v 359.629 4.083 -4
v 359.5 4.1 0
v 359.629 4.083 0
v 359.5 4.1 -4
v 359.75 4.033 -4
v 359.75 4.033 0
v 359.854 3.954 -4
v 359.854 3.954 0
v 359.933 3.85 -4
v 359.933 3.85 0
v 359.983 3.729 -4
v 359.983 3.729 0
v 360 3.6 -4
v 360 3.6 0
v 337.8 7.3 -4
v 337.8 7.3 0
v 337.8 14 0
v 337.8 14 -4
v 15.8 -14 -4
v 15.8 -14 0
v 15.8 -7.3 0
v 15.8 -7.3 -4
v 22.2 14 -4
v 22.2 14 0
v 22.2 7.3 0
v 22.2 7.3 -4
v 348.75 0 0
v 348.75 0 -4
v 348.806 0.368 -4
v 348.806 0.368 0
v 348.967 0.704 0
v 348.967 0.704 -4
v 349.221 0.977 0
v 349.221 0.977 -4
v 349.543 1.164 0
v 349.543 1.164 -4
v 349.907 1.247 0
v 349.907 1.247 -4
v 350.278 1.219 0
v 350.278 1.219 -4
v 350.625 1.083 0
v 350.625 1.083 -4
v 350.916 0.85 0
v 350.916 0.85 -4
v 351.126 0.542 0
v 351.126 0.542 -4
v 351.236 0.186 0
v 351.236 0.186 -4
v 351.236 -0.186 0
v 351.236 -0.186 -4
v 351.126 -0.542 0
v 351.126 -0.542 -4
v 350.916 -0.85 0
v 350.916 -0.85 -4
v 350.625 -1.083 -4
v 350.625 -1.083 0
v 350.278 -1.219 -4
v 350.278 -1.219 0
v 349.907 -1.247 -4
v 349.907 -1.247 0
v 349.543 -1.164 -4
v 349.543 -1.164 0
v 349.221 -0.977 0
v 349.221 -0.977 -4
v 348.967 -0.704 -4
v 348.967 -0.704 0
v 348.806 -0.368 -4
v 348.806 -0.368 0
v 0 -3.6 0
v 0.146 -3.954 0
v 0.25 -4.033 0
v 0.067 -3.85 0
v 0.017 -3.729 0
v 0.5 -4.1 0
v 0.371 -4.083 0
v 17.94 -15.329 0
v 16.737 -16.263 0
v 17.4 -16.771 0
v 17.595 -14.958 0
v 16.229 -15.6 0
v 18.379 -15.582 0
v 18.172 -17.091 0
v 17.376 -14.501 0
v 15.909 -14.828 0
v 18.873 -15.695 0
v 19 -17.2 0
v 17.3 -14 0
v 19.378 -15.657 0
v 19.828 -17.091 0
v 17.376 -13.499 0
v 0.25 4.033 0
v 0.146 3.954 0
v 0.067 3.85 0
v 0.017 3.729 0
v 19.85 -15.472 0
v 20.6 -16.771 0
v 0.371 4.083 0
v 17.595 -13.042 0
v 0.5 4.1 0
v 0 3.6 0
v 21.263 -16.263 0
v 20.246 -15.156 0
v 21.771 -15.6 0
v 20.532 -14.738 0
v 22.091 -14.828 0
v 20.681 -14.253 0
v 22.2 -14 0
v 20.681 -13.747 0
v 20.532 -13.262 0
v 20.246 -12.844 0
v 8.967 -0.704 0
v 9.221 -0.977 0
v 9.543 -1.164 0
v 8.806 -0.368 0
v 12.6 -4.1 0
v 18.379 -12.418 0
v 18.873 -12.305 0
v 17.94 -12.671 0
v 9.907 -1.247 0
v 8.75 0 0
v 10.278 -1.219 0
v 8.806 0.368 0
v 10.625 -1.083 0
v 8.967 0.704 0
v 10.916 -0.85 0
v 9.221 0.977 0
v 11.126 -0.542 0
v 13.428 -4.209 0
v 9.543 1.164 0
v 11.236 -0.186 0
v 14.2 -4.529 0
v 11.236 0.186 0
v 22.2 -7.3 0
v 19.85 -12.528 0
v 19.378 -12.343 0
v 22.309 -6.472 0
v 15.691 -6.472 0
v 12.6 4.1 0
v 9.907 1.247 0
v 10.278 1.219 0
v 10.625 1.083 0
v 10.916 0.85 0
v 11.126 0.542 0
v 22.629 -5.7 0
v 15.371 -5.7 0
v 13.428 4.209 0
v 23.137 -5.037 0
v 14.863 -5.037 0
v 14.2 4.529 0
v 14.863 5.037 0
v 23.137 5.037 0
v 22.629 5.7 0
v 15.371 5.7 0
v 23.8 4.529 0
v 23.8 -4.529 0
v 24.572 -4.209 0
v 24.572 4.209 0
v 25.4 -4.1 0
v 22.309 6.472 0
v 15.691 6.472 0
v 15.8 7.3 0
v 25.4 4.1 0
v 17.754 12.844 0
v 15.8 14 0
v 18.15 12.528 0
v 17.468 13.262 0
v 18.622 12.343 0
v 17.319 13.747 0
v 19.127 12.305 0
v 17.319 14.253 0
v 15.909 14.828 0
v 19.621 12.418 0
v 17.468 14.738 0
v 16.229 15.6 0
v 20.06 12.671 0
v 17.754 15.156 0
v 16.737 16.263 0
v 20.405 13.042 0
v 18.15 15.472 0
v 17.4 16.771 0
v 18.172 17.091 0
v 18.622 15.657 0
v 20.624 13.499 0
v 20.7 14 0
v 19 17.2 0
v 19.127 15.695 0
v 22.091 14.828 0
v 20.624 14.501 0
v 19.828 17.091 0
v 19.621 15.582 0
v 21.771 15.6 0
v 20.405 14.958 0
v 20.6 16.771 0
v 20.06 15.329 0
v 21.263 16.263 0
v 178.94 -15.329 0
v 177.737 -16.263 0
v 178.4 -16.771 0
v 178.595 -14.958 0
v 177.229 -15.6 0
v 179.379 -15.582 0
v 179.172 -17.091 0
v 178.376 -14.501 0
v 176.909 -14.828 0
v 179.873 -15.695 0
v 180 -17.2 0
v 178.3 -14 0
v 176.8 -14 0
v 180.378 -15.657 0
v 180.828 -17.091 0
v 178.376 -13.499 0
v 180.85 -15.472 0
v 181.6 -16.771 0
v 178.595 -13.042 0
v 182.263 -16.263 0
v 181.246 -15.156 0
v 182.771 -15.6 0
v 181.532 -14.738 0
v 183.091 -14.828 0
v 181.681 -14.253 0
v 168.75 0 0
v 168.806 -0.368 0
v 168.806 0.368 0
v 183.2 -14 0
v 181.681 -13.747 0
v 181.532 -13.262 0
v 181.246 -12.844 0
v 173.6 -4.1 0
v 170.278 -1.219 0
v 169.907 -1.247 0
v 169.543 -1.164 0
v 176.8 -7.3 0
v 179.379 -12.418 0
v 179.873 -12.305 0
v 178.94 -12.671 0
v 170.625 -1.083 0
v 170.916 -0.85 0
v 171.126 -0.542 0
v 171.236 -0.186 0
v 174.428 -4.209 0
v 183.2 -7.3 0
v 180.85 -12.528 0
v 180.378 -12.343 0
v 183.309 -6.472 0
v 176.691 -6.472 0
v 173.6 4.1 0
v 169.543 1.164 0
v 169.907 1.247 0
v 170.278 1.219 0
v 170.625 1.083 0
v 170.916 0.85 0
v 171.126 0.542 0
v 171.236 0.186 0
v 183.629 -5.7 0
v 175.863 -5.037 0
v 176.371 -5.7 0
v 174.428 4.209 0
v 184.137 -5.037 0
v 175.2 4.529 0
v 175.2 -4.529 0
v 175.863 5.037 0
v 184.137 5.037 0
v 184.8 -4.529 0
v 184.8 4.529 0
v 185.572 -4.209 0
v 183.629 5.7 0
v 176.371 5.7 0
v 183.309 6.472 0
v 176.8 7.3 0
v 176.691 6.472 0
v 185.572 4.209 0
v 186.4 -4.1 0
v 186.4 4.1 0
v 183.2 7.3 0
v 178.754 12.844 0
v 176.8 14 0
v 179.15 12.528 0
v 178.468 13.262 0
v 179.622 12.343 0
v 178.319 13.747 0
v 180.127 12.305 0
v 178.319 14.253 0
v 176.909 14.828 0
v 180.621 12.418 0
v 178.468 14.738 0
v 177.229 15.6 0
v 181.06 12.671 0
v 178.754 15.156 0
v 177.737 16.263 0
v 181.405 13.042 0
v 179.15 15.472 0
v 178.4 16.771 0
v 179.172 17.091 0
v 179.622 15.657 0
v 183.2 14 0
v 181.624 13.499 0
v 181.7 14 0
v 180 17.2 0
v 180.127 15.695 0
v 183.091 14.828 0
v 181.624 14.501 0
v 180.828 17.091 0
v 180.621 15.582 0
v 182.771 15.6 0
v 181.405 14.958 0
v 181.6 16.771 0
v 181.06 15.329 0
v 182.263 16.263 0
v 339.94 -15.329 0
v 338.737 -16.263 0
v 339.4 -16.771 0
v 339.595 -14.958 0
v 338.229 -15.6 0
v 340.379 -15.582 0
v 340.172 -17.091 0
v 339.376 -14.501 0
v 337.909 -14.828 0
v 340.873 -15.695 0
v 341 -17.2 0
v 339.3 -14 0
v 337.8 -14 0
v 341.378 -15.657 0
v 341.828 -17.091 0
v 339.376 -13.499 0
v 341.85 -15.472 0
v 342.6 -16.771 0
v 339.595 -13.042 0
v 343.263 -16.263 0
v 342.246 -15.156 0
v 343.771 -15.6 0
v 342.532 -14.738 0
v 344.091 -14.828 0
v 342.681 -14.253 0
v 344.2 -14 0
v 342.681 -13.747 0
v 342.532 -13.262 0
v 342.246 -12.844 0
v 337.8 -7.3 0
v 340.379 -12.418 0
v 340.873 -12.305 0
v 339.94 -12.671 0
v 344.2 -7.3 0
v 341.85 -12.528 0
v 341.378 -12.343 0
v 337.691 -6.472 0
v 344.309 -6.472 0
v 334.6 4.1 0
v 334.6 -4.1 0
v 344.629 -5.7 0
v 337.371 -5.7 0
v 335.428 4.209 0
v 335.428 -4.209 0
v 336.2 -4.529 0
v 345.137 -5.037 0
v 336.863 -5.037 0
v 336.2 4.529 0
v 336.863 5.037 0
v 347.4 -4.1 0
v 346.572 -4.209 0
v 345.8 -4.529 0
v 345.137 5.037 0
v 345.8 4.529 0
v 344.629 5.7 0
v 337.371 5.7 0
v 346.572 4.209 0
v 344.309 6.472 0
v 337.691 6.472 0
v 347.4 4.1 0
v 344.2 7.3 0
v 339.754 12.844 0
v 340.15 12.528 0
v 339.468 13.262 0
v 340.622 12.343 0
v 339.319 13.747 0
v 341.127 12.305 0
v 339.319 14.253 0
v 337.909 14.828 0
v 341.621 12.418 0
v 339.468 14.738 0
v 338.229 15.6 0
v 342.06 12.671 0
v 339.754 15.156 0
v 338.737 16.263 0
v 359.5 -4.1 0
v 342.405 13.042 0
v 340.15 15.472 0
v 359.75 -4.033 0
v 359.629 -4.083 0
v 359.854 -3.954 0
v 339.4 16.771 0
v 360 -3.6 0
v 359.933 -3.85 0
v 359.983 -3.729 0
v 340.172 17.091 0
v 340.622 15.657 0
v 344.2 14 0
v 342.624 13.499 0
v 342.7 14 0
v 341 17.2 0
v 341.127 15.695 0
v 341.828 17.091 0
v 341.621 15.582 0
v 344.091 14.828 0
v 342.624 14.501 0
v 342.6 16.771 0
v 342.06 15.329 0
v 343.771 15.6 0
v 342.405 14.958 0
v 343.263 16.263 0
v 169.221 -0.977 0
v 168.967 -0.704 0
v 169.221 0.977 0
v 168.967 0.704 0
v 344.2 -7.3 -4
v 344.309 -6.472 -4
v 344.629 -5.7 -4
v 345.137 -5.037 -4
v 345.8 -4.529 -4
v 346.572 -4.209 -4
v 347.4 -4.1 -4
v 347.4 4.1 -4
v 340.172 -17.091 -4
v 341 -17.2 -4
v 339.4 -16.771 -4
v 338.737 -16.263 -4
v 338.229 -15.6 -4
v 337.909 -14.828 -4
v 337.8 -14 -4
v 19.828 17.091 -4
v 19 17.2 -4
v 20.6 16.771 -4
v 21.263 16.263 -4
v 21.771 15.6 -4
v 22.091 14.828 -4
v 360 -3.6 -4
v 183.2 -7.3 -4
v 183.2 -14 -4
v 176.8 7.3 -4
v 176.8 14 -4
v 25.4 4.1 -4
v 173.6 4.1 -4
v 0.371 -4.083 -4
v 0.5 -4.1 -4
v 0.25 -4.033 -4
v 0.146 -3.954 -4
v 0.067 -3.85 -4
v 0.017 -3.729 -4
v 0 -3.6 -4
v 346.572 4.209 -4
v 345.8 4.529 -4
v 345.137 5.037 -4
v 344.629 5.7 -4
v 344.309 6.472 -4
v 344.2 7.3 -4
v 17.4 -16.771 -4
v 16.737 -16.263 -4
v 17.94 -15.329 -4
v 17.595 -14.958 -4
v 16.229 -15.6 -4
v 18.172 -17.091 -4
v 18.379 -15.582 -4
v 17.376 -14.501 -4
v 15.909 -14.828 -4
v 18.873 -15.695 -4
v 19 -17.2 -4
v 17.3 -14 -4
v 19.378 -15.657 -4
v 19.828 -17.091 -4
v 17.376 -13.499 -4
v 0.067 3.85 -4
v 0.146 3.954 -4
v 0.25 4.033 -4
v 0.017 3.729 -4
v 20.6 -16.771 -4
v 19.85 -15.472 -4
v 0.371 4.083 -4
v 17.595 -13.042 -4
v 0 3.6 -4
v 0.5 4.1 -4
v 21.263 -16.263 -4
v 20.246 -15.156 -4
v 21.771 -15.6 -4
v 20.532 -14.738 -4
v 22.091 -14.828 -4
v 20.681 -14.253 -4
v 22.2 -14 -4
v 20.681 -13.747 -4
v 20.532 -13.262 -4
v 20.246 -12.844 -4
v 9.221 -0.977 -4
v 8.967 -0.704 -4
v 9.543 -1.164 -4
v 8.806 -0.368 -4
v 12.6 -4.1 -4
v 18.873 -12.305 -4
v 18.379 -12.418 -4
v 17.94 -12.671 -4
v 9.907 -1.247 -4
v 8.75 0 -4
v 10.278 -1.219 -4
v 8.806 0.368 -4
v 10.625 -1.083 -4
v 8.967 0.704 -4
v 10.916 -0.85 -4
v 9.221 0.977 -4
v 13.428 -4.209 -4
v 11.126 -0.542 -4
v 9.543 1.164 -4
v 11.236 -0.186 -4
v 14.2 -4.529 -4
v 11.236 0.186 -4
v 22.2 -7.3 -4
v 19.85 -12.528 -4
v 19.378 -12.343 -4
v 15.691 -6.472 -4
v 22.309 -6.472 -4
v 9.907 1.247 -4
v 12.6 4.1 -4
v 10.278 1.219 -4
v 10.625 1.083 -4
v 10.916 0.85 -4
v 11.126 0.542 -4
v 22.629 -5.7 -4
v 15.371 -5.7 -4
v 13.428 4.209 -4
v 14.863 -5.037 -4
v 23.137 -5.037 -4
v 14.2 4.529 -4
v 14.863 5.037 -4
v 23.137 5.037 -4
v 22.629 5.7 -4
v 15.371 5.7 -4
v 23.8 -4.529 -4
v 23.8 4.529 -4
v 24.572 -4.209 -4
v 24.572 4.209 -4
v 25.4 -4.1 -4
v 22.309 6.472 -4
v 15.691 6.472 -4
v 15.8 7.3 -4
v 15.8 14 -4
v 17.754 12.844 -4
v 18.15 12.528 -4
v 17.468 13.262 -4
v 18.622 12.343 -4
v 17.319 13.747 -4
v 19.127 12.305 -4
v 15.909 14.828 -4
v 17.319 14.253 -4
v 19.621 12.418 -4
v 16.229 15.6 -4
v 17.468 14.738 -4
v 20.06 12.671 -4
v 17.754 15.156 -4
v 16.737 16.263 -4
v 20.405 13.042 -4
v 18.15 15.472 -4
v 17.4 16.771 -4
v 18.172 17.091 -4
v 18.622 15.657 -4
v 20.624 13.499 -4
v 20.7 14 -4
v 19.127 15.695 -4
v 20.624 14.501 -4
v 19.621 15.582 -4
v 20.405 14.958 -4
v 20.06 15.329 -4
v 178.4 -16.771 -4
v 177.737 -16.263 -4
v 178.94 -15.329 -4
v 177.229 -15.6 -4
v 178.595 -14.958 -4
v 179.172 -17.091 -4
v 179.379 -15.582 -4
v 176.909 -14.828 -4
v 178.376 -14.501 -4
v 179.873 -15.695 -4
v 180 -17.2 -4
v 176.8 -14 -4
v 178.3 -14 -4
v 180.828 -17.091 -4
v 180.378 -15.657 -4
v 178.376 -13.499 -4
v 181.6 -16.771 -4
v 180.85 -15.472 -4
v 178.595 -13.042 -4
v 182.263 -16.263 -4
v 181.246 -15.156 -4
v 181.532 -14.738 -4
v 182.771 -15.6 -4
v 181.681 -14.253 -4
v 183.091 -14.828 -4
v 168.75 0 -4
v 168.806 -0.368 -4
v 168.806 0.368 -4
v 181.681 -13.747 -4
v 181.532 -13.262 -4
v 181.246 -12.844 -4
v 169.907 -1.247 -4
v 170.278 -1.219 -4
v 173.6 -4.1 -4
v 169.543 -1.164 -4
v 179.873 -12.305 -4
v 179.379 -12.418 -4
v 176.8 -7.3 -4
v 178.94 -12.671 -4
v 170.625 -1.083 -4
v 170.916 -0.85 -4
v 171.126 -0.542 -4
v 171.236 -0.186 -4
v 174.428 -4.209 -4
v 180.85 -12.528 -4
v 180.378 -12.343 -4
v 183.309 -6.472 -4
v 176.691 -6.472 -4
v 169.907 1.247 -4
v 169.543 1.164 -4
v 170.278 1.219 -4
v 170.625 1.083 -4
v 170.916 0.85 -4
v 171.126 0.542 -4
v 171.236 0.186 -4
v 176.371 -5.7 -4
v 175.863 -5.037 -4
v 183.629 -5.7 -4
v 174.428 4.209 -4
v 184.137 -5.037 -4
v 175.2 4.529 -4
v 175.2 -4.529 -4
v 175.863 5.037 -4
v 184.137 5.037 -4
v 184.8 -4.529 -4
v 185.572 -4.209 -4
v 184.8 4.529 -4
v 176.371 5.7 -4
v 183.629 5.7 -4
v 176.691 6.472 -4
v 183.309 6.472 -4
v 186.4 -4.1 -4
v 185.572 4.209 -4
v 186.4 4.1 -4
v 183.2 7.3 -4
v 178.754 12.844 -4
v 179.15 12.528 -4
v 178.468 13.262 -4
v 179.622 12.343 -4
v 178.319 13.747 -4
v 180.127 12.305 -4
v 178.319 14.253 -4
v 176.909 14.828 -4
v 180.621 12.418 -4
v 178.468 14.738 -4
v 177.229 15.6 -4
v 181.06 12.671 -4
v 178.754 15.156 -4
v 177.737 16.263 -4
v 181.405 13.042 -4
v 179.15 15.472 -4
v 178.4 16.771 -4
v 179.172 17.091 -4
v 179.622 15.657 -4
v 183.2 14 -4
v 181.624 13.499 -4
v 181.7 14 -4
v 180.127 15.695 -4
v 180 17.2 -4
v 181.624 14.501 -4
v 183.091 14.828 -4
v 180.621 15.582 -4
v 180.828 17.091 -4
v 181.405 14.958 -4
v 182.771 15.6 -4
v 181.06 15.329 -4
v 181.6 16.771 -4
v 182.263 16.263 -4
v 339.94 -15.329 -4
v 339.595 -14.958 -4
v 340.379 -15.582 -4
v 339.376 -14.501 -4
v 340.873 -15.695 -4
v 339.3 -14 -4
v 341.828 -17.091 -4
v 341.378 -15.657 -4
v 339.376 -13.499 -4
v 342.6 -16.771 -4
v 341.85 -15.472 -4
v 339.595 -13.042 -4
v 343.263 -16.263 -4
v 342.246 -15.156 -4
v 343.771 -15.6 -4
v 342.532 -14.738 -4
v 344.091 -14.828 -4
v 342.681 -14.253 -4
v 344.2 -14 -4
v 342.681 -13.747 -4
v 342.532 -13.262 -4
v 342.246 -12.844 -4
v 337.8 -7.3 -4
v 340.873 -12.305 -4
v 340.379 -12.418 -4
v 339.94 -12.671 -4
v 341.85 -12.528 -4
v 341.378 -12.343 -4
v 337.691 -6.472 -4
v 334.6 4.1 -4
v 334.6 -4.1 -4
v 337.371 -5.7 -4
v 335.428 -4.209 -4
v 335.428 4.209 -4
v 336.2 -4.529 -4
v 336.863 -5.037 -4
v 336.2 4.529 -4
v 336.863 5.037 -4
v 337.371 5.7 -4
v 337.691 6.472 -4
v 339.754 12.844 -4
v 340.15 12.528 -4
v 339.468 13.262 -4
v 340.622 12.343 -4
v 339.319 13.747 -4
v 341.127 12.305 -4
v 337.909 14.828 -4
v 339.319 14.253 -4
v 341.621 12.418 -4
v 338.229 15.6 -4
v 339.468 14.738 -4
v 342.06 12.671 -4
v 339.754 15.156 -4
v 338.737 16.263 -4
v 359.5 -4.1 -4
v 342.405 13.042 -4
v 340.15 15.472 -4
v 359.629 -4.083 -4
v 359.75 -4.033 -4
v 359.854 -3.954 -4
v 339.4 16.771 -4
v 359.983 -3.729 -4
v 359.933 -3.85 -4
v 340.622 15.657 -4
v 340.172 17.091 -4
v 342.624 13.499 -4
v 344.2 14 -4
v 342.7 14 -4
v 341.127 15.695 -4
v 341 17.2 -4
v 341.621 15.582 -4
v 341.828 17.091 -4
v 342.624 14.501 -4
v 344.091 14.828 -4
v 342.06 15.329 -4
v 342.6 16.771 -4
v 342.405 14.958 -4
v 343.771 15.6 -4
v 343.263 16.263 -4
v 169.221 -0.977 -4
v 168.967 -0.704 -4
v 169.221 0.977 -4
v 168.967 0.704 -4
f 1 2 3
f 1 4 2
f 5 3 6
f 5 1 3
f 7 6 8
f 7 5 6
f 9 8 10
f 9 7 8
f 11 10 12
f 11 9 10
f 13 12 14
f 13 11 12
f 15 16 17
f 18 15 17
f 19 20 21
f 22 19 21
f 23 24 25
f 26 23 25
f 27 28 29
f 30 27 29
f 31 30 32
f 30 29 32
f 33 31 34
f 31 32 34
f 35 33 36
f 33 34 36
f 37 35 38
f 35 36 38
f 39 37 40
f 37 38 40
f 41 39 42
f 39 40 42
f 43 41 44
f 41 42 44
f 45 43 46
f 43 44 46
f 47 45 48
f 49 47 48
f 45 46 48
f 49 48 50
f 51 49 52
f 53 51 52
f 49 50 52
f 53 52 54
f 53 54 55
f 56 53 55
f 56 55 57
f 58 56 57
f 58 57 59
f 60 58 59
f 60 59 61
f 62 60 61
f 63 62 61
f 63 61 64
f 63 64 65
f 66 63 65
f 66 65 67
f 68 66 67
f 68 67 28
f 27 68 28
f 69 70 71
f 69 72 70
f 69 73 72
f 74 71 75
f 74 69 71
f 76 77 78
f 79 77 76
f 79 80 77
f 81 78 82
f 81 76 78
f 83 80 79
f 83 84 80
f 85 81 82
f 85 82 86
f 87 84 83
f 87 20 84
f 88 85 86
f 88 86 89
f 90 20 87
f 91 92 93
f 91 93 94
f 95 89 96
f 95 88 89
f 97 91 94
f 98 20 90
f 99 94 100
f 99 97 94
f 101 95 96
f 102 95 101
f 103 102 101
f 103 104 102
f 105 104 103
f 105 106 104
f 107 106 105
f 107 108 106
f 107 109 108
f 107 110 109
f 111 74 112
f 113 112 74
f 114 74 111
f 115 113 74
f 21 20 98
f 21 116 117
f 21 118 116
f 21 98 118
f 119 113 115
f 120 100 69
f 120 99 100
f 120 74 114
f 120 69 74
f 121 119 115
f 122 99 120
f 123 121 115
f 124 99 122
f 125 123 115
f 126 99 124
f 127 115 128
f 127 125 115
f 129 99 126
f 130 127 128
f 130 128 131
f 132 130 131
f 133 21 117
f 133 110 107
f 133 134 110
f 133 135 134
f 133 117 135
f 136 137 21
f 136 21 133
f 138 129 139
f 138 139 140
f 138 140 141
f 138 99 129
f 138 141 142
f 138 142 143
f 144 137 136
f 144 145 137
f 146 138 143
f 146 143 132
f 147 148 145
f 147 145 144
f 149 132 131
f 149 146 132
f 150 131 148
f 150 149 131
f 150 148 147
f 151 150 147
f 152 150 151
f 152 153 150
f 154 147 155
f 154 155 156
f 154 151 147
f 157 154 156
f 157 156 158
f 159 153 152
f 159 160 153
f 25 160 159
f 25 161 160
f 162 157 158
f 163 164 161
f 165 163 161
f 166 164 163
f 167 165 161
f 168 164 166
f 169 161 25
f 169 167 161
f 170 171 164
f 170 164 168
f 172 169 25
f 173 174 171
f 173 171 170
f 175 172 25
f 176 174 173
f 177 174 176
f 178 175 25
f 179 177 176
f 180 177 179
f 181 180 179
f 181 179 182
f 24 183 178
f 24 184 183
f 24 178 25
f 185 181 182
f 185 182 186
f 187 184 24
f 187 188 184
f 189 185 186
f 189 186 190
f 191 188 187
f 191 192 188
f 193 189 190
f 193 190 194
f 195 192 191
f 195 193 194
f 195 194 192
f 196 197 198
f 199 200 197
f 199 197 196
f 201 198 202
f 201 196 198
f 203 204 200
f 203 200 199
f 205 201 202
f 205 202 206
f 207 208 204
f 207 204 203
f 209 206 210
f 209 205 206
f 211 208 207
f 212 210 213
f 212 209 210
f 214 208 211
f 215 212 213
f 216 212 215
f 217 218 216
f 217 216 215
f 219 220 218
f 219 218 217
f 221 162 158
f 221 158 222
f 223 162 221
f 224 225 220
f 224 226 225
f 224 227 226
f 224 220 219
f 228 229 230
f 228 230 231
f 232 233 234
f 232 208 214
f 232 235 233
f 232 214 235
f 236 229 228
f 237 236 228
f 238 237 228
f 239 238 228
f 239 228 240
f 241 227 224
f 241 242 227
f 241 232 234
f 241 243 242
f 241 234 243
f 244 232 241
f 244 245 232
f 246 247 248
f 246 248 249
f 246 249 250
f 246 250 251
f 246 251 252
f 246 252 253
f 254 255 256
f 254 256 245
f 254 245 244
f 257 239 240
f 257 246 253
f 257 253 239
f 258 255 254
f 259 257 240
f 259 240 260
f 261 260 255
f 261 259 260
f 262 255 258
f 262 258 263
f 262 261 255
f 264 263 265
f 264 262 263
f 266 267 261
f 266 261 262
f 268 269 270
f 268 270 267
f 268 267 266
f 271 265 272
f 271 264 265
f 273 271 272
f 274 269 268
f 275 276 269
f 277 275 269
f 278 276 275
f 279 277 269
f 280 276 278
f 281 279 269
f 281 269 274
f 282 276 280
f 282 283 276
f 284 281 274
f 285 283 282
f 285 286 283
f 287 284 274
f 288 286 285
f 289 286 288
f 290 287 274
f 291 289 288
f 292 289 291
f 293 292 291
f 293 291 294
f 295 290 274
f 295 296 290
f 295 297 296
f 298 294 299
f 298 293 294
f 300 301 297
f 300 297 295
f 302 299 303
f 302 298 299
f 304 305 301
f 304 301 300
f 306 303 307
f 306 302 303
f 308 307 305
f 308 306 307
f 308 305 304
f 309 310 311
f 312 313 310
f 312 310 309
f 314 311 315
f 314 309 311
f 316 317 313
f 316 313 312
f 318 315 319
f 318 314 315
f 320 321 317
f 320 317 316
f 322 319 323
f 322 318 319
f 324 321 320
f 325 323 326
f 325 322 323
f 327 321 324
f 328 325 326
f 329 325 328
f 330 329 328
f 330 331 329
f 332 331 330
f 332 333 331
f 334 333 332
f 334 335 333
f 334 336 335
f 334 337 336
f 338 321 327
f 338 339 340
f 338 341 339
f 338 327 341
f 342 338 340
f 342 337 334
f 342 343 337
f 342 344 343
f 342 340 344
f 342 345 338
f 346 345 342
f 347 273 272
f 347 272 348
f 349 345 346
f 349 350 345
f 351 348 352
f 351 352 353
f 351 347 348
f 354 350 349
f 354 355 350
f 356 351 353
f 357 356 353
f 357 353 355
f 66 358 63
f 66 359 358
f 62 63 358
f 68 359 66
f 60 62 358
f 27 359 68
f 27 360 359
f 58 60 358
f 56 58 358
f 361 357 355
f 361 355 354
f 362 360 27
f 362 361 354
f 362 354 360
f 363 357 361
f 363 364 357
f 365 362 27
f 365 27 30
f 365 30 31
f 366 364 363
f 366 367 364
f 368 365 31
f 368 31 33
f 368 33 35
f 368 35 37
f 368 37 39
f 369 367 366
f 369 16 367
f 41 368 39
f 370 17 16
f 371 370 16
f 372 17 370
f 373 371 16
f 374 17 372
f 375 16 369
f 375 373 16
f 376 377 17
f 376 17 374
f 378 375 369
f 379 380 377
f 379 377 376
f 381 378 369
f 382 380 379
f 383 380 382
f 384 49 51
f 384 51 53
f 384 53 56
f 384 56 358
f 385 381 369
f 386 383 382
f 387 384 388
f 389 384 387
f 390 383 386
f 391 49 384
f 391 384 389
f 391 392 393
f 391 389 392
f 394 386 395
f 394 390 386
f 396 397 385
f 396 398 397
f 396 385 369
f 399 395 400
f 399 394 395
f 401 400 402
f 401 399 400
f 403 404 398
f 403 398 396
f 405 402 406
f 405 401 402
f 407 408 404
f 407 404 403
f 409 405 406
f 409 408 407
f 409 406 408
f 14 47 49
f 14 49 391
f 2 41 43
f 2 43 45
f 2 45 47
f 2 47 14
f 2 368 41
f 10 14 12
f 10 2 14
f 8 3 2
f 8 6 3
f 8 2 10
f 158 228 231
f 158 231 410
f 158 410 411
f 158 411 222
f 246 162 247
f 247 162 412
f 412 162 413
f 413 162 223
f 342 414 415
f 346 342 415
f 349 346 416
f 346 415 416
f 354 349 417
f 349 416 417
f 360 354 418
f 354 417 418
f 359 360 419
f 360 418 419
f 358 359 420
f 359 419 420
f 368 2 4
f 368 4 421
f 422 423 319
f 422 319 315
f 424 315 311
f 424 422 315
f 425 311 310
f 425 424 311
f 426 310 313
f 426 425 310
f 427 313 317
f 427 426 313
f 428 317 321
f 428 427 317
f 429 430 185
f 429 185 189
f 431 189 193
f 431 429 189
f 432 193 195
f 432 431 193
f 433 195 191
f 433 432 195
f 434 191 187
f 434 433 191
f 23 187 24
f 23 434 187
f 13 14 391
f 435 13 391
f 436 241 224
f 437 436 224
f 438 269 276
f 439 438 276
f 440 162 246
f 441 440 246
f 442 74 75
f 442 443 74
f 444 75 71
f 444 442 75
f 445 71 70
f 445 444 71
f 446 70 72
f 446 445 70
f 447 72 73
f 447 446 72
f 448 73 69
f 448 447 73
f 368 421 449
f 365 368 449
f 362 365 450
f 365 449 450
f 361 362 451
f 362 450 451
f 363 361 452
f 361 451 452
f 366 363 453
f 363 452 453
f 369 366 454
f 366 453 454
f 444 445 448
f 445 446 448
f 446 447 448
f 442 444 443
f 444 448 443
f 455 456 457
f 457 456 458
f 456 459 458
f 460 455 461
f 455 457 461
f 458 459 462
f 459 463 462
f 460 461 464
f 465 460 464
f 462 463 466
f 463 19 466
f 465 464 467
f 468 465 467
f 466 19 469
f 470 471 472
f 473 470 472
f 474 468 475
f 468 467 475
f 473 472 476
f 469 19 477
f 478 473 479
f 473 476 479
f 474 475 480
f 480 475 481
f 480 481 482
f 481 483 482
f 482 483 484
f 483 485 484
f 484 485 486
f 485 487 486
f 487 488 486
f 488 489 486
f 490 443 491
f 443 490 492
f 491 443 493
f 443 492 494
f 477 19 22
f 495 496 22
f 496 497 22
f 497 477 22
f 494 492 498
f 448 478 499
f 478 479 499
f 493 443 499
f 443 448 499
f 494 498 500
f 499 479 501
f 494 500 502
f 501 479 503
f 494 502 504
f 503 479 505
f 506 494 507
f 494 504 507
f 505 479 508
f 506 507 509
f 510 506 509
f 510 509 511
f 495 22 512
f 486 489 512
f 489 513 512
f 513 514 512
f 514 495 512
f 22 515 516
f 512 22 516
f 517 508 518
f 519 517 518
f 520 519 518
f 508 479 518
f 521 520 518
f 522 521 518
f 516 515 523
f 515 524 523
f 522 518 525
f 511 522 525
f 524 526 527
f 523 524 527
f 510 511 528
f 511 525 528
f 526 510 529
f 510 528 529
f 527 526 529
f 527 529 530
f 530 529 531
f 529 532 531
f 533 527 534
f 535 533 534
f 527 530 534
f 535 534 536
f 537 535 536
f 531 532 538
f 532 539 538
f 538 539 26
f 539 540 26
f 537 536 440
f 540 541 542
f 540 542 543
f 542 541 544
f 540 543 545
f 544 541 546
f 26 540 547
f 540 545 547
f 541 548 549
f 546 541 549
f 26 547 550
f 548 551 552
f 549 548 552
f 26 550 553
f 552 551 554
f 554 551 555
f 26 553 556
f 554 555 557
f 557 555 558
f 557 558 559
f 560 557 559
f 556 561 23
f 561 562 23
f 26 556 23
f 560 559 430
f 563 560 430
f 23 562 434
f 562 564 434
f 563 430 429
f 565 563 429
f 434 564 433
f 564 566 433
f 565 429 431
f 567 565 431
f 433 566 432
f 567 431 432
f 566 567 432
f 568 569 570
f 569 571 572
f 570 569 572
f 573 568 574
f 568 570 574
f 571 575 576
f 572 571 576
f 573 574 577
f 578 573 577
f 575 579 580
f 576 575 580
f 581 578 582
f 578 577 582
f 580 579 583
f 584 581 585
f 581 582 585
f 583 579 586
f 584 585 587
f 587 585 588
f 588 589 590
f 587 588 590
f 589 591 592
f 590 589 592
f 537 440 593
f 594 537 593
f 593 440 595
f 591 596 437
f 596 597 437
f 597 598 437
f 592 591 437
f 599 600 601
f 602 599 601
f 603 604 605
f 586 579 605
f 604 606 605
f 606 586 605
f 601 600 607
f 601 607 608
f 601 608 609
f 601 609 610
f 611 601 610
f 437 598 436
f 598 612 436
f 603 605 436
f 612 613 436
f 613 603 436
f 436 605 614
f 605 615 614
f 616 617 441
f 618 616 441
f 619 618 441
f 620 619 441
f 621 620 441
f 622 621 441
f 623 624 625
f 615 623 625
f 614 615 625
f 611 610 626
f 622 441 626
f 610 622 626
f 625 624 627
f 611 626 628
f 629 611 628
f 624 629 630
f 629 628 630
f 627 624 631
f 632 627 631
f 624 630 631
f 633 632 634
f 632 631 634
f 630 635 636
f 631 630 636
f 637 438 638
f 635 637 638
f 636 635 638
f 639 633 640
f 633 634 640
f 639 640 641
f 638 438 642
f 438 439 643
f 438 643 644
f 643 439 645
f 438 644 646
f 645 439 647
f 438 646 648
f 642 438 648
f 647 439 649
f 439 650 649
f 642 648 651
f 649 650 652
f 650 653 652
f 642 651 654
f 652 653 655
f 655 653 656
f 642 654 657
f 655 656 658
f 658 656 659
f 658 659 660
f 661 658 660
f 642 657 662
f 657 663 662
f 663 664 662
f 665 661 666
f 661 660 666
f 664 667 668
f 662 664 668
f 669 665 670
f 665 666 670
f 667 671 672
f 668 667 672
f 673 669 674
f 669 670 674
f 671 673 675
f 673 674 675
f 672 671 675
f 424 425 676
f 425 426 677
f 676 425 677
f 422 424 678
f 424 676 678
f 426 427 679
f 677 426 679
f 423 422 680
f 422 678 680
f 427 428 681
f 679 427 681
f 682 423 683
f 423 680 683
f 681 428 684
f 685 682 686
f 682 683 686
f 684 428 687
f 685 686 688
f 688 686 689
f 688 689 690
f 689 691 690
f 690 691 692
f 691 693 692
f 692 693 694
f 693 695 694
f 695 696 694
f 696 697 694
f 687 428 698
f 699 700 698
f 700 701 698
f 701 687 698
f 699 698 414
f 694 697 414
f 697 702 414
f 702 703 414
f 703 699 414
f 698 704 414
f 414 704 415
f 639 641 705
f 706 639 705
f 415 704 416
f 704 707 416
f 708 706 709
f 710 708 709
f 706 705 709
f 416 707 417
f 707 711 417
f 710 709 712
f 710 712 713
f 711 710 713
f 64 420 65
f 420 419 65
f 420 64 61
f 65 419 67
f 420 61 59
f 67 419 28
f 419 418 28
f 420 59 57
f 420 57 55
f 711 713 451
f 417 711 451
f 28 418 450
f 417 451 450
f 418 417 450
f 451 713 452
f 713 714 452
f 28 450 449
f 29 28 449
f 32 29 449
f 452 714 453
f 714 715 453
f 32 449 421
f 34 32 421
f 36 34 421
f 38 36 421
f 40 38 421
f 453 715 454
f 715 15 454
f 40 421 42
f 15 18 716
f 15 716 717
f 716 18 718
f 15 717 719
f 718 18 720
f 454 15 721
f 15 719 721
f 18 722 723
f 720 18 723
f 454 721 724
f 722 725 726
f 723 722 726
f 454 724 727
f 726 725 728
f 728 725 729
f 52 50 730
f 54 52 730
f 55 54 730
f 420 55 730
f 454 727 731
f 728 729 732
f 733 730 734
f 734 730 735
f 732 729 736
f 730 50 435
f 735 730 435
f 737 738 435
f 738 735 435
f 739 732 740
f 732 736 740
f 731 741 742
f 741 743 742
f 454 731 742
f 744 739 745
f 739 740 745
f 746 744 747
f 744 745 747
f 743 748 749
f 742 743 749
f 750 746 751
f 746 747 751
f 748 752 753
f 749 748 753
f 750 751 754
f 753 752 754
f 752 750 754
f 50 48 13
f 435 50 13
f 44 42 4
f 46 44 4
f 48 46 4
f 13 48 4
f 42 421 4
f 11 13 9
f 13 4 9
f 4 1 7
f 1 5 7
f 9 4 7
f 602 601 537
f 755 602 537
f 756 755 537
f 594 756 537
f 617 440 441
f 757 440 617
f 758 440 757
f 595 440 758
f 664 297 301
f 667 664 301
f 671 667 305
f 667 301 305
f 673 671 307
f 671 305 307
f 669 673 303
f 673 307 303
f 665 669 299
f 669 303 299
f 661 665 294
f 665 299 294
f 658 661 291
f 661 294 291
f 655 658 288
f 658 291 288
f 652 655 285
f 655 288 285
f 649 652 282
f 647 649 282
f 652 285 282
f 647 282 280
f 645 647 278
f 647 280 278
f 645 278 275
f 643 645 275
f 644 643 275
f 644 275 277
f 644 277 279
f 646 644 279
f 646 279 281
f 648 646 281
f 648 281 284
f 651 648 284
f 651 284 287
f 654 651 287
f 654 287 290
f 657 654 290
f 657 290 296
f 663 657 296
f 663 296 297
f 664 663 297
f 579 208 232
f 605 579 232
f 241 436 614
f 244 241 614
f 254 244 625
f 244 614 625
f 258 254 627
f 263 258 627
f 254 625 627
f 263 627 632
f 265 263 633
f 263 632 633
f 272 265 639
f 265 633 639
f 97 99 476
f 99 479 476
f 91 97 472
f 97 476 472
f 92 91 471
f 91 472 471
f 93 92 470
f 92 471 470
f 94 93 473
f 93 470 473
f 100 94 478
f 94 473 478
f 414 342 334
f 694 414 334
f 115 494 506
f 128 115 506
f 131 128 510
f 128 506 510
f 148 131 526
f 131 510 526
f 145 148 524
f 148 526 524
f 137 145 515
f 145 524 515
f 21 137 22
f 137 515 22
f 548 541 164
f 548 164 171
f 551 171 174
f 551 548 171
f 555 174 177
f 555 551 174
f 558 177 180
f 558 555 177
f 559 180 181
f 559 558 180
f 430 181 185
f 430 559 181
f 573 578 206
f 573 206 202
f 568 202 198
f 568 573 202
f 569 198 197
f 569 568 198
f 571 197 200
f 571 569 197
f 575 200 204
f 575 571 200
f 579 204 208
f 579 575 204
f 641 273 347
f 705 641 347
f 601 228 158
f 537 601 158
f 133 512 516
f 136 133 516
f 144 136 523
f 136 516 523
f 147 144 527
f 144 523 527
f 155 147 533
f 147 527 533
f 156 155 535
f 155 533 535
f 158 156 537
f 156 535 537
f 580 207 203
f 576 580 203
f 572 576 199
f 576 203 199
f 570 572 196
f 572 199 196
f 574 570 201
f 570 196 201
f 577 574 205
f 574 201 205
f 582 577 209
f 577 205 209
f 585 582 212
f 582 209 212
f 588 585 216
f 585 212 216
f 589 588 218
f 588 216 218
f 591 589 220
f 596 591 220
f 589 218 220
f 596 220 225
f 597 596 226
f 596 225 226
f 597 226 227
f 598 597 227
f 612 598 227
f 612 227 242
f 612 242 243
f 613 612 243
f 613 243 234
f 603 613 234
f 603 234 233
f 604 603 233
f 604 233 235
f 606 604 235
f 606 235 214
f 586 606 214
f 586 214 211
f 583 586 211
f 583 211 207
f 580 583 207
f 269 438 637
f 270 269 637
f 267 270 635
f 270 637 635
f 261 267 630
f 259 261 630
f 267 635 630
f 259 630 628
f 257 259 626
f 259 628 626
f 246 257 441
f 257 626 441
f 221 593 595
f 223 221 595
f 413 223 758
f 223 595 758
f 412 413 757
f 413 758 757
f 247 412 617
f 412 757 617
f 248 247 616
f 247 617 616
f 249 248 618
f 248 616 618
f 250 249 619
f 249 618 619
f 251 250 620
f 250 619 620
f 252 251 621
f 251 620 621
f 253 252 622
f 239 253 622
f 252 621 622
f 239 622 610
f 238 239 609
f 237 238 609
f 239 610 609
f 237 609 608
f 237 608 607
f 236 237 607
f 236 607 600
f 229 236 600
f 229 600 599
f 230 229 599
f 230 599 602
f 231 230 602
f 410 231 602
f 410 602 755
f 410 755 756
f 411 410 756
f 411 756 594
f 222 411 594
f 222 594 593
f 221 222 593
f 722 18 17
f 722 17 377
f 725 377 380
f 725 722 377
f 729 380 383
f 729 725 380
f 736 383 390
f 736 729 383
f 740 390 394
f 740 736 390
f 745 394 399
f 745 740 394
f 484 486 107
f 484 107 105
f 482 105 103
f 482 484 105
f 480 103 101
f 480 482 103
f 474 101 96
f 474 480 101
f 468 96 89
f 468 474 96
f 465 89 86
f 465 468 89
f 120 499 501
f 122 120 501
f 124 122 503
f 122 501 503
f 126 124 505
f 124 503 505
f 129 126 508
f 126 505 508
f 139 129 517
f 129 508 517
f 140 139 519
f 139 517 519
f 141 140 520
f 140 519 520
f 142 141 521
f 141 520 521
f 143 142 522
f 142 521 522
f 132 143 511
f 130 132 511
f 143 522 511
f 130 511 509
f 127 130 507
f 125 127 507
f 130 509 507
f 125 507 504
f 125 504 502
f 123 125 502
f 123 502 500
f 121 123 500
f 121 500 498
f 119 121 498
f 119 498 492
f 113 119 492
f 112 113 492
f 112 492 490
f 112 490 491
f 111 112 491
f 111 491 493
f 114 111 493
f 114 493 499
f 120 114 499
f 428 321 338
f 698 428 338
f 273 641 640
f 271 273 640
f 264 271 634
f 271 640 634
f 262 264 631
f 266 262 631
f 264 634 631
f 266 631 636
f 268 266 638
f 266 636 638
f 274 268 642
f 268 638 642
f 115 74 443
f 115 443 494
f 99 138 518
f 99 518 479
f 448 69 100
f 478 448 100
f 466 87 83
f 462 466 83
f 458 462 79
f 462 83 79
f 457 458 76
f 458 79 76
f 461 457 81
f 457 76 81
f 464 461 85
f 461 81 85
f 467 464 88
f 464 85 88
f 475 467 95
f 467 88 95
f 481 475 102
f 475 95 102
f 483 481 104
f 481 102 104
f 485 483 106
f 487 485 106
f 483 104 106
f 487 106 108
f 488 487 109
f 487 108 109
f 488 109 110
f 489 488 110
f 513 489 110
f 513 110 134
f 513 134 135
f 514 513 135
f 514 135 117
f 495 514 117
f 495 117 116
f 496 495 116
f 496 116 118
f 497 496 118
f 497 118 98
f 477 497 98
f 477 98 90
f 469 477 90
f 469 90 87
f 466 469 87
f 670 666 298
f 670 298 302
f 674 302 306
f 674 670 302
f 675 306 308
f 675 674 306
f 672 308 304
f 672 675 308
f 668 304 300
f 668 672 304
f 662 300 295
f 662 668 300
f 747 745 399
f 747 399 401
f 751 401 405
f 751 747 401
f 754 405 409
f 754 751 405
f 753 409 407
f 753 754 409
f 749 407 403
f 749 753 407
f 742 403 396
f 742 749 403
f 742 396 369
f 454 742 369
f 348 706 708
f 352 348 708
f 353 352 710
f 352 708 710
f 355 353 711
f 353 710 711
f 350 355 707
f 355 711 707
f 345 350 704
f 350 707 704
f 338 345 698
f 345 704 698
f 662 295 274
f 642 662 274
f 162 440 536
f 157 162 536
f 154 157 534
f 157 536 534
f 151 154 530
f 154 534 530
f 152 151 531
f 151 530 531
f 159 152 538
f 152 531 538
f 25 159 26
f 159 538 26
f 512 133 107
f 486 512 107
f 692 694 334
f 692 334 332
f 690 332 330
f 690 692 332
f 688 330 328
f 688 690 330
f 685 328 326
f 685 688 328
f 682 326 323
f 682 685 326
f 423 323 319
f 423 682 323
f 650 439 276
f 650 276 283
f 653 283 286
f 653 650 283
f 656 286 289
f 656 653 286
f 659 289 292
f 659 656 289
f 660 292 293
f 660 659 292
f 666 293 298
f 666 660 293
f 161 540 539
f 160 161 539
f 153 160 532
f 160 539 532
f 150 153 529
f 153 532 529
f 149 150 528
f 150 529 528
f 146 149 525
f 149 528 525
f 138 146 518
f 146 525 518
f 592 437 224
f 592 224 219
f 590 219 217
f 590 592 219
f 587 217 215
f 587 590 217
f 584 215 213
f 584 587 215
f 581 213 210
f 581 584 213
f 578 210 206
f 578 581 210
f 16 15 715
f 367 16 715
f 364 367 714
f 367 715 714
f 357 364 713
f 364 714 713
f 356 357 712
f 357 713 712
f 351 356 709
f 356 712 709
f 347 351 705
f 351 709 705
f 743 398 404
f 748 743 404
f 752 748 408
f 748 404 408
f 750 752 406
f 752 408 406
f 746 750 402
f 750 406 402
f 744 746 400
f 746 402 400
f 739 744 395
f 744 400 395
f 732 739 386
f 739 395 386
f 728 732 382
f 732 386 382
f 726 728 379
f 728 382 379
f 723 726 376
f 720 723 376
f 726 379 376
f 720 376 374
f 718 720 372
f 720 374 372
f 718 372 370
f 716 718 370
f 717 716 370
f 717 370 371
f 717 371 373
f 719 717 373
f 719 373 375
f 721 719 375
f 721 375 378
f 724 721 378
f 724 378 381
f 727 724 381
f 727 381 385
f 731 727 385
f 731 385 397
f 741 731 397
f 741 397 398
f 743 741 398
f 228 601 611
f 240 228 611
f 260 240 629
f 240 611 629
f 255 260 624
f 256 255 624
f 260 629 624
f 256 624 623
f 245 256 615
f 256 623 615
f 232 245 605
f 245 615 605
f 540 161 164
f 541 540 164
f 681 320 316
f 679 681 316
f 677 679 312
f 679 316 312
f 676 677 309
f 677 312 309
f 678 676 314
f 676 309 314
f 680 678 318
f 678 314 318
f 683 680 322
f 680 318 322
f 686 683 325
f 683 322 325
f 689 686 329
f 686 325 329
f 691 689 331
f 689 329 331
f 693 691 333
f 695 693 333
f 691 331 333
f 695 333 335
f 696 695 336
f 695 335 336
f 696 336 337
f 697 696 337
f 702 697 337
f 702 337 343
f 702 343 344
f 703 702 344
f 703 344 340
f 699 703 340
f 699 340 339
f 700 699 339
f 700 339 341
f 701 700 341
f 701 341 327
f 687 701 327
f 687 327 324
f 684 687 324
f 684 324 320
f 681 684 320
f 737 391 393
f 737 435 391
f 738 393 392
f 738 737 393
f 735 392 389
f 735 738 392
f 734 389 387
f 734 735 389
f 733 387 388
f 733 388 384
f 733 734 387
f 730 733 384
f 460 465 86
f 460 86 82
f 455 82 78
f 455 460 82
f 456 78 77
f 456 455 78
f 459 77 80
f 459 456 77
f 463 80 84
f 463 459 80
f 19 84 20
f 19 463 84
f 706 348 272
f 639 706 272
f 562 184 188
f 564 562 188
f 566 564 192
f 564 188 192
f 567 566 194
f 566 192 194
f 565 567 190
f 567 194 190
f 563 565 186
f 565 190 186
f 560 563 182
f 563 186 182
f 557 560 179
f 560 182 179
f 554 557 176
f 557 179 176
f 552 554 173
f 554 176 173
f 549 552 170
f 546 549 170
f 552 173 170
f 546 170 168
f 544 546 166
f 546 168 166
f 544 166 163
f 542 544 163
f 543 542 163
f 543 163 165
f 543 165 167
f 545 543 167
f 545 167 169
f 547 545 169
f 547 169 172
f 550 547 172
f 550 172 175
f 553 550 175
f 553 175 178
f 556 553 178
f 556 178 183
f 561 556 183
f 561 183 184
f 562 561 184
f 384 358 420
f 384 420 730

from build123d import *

# Parameters (mm, degrees)
BRIDA_BASE1_DEPTH     = 4
CROQUIS6_R            = 1.2
CORTAR_EXTRUIR1_DEPTH = 361.432850889
TALADRO_ROSCADO_M3_D  = 2.5
CROQUIS11_R           = 1.7
CORTAR_EXTRUIR2_DEPTH = 361.432850889
REDONDEO1_START       = -5
REDONDEO1_DEPTH       = 6
REDONDEO1_START_2     = -4
REDONDEO1_2_DEPTH     = 4
REDONDEO2_R           = 0.5


with BuildPart() as part:
    # Brida base1: sheet metal written as solids
    # Croquis1 → Brida base1 (new body)
    with BuildSketch(Plane.XY):
        Polygon((0, -4.1), (0, 4.1), (8, 4.1), (15.8, 4.1), (15.8, 17.2), (22.2, 17.2), (22.2, 4.1), (176.8, 4.1), (176.8, 17.2), (183.2, 17.2), (183.2, 4.1), (337.8, 4.1), (337.8, 17.2), (344.2, 17.2), (344.2, 4.1), (352, 4.1), (360, 4.1), (360, -4.1), (352, -4.1), (344.2, -4.1), (344.2, -17.2), (337.8, -17.2), (337.8, -4.1), (183.2, -4.1), (183.2, -17.2), (176.8, -17.2), (176.8, -4.1), (22.2, -4.1), (22.2, -17.2), (15.8, -17.2), (15.8, -4.1), (8, -4.1), align=None)
    extrude(amount=-BRIDA_BASE1_DEPTH)

    # Croquis6 → Cortar-Extruir1 (cut, through all)
    with BuildSketch(Plane.XY):
        with Locations((10, 0)):
            Circle(CROQUIS6_R)
        with Locations((350, 0)):
            Circle(CROQUIS6_R)
        with Locations((170, 0)):
            Circle(CROQUIS6_R)
    extrude(amount=-CORTAR_EXTRUIR1_DEPTH, mode=Mode.SUBTRACT)

    # Taladro roscado M3 (through all)
    with Locations(Plane.XY):
        with Locations((10, 0), (170, 0), (350, 0)):
            Hole(TALADRO_ROSCADO_M3_D / 2)

    # Croquis11 → Cortar-Extruir2 (cut, through all)
    with BuildSketch(Plane.XY):
        with Locations((19, 14)):
            Circle(CROQUIS11_R)
        with Locations((180, 14)):
            Circle(CROQUIS11_R)
        with Locations((341, 14)):
            Circle(CROQUIS11_R)
        with Locations(Location((341, -14, 0), (0, 0, 180))):
            Circle(CROQUIS11_R)
        with Locations(Location((180, -14, 0), (0, 0, 180))):
            Circle(CROQUIS11_R)
        with Locations(Location((19, -14, 0), (0, 0, 180))):
            Circle(CROQUIS11_R)
    extrude(amount=-CORTAR_EXTRUIR2_DEPTH, mode=Mode.SUBTRACT)

    # Redondeo1: read off the stored shape, not the designer's step
    # Redondeo1 outline → Redondeo1 (cut)
    with BuildSketch(Plane.XY.offset(REDONDEO1_START)):
        with BuildLine():
            ThreePointArc((15.8, 14), (16.7372583, 16.2627417), (19, 17.2))
            Line((19, 17.2), (15.8, 17.2))
            Line((15.8, 17.2), (15.8, 14))
        make_face()
        with BuildLine():
            ThreePointArc((19, 17.2), (21.2627417, 16.2627417), (22.2, 14))
            Line((22.2, 14), (22.2, 17.2))
            Line((22.2, 17.2), (19, 17.2))
        make_face()
        with BuildLine():
            ThreePointArc((176.8, 14), (177.7372583, 16.2627417), (180, 17.2))
            Line((180, 17.2), (176.8, 17.2))
            Line((176.8, 17.2), (176.8, 14))
        make_face()
        with BuildLine():
            ThreePointArc((180, 17.2), (182.2627417, 16.2627417), (183.2, 14))
            Line((183.2, 14), (183.2, 17.2))
            Line((183.2, 17.2), (180, 17.2))
        make_face()
        with BuildLine():
            ThreePointArc((337.8, 14), (338.7372583, 16.2627417), (341, 17.2))
            Line((341, 17.2), (337.8, 17.2))
            Line((337.8, 17.2), (337.8, 14))
        make_face()
        with BuildLine():
            ThreePointArc((341, 17.2), (343.2627417, 16.2627417), (344.2, 14))
            Line((344.2, 14), (344.2, 17.2))
            Line((344.2, 17.2), (341, 17.2))
        make_face()
        with BuildLine():
            ThreePointArc((344.2, -14), (343.2627417, -16.2627417), (341, -17.2))
            Line((341, -17.2), (344.2, -17.2))
            Line((344.2, -17.2), (344.2, -14))
        make_face()
        with BuildLine():
            ThreePointArc((341, -17.2), (338.7372583, -16.2627417), (337.8, -14))
            Line((337.8, -14), (337.8, -17.2))
            Line((337.8, -17.2), (341, -17.2))
        make_face()
        with BuildLine():
            ThreePointArc((183.2, -14), (182.2627417, -16.2627417), (180, -17.2))
            Line((180, -17.2), (183.2, -17.2))
            Line((183.2, -17.2), (183.2, -14))
        make_face()
        with BuildLine():
            ThreePointArc((180, -17.2), (177.7372583, -16.2627417), (176.8, -14))
            Line((176.8, -14), (176.8, -17.2))
            Line((176.8, -17.2), (180, -17.2))
        make_face()
        with BuildLine():
            ThreePointArc((22.2, -14), (21.2627417, -16.2627417), (19, -17.2))
            Line((19, -17.2), (22.2, -17.2))
            Line((22.2, -17.2), (22.2, -14))
        make_face()
        with BuildLine():
            ThreePointArc((19, -17.2), (16.7372583, -16.2627417), (15.8, -14))
            Line((15.8, -14), (15.8, -17.2))
            Line((15.8, -17.2), (19, -17.2))
        make_face()
    extrude(amount=REDONDEO1_DEPTH, mode=Mode.SUBTRACT)

    # Redondeo1 2 outline → Redondeo1 2 (add)
    with BuildSketch(Plane.XY.offset(REDONDEO1_START_2)):
        with BuildLine():
            Line((344.2, 4.1), (347.4, 4.1))
            ThreePointArc((347.4, 4.1), (345.1372583, 5.0372583), (344.2, 7.3))
            Line((344.2, 7.3), (344.2, 4.1))
        make_face()
        with BuildLine():
            Line((15.8, 4.1), (15.8, 7.3))
            ThreePointArc((15.8, 7.3), (14.8627417, 5.0372583), (12.6, 4.1))
            Line((12.6, 4.1), (15.8, 4.1))
        make_face()
        with BuildLine():
            Line((22.2, 4.1), (25.4, 4.1))
            ThreePointArc((25.4, 4.1), (23.1372583, 5.0372583), (22.2, 7.3))
            Line((22.2, 7.3), (22.2, 4.1))
        make_face()
        with BuildLine():
            Line((176.8, 4.1), (176.8, 7.3))
            ThreePointArc((176.8, 7.3), (175.8627417, 5.0372583), (173.6, 4.1))
            Line((173.6, 4.1), (176.8, 4.1))
        make_face()
        with BuildLine():
            Line((183.2, 4.1), (186.4, 4.1))
            ThreePointArc((186.4, 4.1), (184.1372583, 5.0372583), (183.2, 7.3))
            Line((183.2, 7.3), (183.2, 4.1))
        make_face()
        with BuildLine():
            Line((337.8, 4.1), (337.8, 7.3))
            ThreePointArc((337.8, 7.3), (336.8627417, 5.0372583), (334.6, 4.1))
            Line((334.6, 4.1), (337.8, 4.1))
        make_face()
        with BuildLine():
            Line((15.8, -4.1), (12.6, -4.1))
            ThreePointArc((12.6, -4.1), (14.8627417, -5.0372583), (15.8, -7.3))
            Line((15.8, -7.3), (15.8, -4.1))
        make_face()
        with BuildLine():
            Line((344.2, -4.1), (344.2, -7.3))
            ThreePointArc((344.2, -7.3), (345.1372583, -5.0372583), (347.4, -4.1))
            Line((347.4, -4.1), (344.2, -4.1))
        make_face()
        with BuildLine():
            Line((337.8, -4.1), (334.6, -4.1))
            ThreePointArc((334.6, -4.1), (336.8627417, -5.0372583), (337.8, -7.3))
            Line((337.8, -7.3), (337.8, -4.1))
        make_face()
        with BuildLine():
            Line((183.2, -4.1), (183.2, -7.3))
            ThreePointArc((183.2, -7.3), (184.1372583, -5.0372583), (186.4, -4.1))
            Line((186.4, -4.1), (183.2, -4.1))
        make_face()
        with BuildLine():
            Line((176.8, -4.1), (173.6, -4.1))
            ThreePointArc((173.6, -4.1), (175.8627417, -5.0372583), (176.8, -7.3))
            Line((176.8, -7.3), (176.8, -4.1))
        make_face()
        with BuildLine():
            Line((22.2, -4.1), (22.2, -7.3))
            ThreePointArc((22.2, -7.3), (23.1372583, -5.0372583), (25.4, -4.1))
            Line((25.4, -4.1), (22.2, -4.1))
        make_face()
    extrude(amount=REDONDEO1_2_DEPTH)

    # Redondeo2
    redondeo2_edges = [part.edges().sort_by_distance(p)[0] for p in [
        (0, -4.1, -2),
        (0, 4.1, -2),
        (360, 4.1, -2),
        (360, -4.1, -2),
    ]]
    fillet(redondeo2_edges, radius=REDONDEO2_R)


solid = part.part
